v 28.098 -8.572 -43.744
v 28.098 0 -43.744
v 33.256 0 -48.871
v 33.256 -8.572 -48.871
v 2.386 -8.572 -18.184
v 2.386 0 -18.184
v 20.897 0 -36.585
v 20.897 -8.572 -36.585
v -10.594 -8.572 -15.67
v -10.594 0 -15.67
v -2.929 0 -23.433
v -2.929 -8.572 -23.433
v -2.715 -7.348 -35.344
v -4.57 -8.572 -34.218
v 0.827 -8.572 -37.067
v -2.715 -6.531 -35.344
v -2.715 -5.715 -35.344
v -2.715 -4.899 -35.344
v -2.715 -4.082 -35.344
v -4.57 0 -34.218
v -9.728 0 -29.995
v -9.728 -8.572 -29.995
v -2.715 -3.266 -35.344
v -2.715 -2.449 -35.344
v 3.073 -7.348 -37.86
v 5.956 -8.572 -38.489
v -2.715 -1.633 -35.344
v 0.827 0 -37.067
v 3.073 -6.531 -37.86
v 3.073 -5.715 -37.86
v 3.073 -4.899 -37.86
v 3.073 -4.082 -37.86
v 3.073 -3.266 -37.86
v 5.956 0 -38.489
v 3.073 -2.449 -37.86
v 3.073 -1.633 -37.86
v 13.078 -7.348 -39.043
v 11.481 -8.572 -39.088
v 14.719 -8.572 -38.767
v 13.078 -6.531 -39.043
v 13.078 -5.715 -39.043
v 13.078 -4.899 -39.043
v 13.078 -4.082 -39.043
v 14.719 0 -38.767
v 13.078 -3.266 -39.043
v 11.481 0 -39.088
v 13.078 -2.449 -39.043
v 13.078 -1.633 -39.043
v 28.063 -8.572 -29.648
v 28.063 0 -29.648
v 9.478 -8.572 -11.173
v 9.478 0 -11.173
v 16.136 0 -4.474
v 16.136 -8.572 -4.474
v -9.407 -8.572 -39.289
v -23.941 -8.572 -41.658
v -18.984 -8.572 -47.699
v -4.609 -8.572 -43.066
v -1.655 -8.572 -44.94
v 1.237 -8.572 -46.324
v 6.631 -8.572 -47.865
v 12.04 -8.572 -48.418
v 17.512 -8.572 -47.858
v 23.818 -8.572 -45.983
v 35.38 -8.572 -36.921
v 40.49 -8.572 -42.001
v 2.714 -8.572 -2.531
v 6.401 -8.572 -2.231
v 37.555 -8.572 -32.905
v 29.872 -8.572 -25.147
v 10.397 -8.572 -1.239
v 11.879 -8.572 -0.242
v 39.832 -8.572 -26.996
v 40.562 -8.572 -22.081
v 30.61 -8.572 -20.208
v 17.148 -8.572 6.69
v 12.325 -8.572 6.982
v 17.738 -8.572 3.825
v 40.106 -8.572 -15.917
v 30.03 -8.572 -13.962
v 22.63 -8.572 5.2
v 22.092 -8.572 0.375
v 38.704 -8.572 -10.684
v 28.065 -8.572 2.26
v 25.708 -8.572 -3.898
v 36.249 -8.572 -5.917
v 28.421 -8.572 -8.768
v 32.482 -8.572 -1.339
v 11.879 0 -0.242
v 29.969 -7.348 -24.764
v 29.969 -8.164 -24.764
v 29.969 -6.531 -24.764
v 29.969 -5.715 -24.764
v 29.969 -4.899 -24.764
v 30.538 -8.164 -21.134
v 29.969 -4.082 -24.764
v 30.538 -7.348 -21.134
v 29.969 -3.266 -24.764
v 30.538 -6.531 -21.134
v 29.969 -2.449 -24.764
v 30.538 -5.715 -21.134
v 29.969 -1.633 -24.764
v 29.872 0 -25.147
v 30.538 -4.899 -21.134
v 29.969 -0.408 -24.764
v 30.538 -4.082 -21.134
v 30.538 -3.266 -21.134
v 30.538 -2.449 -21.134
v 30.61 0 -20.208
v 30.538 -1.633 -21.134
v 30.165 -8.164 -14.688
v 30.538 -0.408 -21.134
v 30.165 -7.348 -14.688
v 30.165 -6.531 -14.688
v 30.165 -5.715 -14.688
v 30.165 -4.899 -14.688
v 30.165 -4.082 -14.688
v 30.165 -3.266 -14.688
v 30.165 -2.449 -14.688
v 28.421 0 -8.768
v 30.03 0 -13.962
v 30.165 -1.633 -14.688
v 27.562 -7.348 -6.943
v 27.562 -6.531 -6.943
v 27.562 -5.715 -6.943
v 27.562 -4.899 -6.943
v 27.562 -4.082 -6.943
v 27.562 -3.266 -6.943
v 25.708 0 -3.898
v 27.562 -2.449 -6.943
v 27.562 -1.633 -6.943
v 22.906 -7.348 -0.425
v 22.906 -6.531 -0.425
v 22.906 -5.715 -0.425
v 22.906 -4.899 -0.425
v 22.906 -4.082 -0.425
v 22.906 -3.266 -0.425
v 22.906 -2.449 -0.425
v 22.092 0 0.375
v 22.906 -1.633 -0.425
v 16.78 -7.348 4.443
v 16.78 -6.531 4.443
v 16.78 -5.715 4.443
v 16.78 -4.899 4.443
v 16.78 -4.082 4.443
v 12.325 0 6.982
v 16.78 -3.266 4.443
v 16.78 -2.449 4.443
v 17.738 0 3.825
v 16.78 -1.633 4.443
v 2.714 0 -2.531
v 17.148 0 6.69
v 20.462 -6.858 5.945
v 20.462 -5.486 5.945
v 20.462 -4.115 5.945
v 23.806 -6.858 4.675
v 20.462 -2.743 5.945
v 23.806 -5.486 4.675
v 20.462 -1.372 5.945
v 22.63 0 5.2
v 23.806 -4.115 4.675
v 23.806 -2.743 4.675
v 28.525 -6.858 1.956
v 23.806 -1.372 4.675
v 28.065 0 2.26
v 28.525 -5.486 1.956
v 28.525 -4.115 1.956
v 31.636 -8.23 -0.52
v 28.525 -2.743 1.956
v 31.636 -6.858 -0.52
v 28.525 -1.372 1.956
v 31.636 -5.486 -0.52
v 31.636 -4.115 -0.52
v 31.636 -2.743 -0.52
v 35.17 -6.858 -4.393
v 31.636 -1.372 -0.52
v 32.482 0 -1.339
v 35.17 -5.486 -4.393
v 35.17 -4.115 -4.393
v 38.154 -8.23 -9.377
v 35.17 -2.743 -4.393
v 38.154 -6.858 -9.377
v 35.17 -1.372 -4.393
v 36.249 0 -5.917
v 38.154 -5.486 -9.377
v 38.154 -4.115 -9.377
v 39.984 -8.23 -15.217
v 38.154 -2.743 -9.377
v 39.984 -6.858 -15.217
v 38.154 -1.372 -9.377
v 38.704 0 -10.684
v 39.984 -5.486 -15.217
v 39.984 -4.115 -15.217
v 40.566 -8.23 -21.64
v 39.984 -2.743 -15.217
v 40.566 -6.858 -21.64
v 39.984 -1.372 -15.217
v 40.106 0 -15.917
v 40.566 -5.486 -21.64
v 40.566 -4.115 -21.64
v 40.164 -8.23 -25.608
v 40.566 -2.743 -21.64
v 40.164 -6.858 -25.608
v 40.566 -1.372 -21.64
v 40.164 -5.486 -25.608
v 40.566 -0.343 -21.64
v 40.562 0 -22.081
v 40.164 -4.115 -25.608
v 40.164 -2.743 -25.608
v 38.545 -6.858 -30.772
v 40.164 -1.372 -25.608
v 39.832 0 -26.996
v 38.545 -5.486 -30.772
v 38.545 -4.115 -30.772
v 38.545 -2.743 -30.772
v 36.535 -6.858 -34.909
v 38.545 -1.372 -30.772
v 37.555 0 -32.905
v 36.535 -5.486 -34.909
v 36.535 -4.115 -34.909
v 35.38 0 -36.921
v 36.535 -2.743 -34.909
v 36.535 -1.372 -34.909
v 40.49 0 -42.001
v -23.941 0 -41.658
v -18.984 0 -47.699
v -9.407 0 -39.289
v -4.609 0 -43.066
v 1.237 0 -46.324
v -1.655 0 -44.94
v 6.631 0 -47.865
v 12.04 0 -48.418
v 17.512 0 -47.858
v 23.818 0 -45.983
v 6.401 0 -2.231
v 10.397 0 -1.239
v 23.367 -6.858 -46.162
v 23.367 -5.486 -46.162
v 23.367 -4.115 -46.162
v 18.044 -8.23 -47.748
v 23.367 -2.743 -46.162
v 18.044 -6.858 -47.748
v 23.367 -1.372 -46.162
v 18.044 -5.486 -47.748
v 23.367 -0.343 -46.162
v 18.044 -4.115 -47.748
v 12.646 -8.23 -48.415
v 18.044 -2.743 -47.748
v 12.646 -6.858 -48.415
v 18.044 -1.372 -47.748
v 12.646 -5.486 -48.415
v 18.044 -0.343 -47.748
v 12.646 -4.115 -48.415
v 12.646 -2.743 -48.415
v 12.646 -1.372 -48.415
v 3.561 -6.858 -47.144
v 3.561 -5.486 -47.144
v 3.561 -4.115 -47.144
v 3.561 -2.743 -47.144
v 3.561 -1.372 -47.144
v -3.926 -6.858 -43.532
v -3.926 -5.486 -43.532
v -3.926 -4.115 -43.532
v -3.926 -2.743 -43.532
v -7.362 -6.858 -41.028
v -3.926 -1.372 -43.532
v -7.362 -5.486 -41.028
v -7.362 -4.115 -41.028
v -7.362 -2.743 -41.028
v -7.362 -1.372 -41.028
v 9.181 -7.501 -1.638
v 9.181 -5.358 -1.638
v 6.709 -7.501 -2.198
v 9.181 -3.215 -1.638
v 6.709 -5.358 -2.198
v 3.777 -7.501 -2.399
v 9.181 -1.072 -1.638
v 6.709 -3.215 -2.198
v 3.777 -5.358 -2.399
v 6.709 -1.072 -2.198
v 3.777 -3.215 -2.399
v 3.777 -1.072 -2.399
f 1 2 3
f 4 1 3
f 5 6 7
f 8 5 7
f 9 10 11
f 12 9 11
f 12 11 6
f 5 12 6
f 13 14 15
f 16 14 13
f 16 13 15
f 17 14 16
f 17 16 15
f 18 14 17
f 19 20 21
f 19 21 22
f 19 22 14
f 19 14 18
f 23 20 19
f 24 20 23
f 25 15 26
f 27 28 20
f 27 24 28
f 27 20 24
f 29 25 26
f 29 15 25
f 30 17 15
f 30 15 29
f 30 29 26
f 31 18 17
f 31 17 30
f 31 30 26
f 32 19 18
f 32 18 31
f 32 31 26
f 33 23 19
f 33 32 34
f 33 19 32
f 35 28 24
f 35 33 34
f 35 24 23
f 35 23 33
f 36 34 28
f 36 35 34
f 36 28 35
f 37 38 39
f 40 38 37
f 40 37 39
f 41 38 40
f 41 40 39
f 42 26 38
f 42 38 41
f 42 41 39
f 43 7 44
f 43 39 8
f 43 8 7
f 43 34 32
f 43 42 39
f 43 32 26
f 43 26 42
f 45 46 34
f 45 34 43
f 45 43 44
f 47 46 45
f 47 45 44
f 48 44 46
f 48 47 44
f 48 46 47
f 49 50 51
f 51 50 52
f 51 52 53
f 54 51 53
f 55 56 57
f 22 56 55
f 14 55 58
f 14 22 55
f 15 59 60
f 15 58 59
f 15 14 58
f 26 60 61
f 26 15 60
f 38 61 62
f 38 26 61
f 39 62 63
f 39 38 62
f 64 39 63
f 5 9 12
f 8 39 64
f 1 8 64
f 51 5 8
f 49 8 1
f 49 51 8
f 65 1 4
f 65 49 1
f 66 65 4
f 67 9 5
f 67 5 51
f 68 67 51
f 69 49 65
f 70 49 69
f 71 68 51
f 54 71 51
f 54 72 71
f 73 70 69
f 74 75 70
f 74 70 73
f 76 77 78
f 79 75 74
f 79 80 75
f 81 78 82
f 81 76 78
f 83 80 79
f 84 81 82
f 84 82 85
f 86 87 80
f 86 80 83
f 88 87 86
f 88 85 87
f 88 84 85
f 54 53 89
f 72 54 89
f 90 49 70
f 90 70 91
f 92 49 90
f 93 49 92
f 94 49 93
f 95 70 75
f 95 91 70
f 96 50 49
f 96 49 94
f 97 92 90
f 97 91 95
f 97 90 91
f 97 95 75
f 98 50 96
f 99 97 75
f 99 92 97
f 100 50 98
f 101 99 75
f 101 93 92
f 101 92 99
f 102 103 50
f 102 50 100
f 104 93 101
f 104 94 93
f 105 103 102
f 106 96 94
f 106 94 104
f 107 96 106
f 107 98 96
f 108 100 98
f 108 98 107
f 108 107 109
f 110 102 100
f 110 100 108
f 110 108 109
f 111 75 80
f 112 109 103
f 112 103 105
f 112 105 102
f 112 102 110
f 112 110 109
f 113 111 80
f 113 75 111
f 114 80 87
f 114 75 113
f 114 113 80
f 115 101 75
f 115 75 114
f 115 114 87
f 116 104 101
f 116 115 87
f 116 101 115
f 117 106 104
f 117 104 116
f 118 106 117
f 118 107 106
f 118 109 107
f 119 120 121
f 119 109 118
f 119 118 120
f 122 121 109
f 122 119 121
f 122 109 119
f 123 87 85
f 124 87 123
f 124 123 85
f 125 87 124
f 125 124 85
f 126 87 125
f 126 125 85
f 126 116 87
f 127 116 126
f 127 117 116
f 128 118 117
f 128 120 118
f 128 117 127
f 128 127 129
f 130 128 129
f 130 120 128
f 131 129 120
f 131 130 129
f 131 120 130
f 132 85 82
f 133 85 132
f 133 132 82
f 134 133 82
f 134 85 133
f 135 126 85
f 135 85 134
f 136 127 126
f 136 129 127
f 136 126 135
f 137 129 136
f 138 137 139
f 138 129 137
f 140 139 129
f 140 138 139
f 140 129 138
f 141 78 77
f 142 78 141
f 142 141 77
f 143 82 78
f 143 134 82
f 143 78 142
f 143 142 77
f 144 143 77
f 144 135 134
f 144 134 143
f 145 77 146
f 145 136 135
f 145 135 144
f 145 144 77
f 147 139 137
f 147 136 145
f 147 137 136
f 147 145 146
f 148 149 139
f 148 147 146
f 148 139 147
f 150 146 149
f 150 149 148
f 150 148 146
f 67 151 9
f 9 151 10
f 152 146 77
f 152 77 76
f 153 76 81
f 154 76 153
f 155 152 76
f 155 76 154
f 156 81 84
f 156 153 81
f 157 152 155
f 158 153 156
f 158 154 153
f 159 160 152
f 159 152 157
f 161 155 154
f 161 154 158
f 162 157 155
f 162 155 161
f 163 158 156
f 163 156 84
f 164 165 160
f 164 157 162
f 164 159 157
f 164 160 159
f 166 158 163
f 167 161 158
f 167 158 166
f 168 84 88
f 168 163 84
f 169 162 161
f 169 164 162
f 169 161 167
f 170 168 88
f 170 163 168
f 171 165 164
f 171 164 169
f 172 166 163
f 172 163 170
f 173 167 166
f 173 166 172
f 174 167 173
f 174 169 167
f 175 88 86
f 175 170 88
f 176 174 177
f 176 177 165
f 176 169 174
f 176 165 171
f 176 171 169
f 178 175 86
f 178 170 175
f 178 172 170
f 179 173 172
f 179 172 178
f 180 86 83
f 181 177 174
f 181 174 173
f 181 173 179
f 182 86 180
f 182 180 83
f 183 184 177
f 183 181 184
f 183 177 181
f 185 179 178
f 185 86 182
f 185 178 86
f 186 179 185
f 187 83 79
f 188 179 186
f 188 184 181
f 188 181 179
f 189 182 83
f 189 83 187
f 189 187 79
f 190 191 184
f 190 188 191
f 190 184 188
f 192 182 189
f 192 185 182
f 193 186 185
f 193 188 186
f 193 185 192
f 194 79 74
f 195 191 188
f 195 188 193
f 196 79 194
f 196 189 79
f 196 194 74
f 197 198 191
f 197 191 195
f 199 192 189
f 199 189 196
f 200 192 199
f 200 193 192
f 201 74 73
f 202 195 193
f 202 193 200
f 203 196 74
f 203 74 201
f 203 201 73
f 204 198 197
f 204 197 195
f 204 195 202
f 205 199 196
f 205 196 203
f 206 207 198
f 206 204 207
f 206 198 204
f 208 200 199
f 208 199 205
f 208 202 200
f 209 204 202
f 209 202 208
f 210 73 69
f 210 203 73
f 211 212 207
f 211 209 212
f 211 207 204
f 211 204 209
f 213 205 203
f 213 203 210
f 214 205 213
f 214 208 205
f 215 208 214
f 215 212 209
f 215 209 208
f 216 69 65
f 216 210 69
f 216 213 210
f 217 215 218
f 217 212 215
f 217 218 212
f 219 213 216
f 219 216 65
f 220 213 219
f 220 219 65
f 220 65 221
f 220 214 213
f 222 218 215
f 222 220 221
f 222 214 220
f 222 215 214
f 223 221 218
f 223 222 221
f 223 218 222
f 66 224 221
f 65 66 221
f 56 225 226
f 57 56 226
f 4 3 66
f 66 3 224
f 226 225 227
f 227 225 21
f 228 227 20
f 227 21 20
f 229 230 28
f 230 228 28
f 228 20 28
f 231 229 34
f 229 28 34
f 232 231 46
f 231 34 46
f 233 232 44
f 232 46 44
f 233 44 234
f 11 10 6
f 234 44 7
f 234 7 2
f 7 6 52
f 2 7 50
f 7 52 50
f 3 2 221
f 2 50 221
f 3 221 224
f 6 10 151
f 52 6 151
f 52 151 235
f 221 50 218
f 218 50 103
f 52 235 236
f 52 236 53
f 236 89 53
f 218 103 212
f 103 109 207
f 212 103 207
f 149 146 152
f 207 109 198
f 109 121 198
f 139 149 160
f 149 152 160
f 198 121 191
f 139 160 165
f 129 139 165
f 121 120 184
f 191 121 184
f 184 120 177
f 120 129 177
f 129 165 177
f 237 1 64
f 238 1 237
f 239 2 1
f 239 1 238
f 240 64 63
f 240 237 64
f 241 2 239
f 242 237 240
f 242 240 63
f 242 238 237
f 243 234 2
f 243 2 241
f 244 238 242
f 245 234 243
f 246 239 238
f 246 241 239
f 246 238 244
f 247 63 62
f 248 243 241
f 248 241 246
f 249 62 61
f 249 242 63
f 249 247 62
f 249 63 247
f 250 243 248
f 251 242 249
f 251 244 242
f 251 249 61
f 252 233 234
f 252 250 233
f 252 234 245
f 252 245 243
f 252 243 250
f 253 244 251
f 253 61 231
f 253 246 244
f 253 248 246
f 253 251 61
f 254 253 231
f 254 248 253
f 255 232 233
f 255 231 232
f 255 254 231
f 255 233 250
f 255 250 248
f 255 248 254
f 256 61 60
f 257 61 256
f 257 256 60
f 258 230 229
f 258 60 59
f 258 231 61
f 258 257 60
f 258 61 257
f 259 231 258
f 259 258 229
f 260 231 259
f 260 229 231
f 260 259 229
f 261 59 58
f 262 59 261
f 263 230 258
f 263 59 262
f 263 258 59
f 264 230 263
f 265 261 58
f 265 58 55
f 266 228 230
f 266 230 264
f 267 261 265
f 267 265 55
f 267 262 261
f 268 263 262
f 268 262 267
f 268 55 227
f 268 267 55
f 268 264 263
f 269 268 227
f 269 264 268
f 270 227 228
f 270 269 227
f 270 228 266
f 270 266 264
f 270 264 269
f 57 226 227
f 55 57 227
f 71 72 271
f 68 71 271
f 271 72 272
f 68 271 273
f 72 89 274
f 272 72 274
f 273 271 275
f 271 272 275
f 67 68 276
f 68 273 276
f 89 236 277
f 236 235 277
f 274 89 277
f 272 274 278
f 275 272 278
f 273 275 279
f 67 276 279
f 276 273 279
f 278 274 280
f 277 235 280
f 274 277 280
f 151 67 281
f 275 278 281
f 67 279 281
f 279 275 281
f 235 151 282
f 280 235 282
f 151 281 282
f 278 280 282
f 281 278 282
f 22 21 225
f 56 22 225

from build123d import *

# Parameters (mm, degrees)
F2_DEPTH = 6.35
F3_DEPTH = 6.35
F4_SCALE = 1.35


with BuildPart() as f2:
    # F1 (on Front) → F2 (new body)
    with BuildSketch(Plane.XZ):
        with BuildLine():
            Line((2.0100830588, -1.8745424459), (-7.8472765163, -11.6076041013))
            Line((-7.8472765163, -11.6076041013), (-2.1699381241, -17.3574460259))
            Line((-2.1699381241, -17.3574460259), (1.7674344249, -13.4697223929))
            Line((1.7674344249, -13.4697223929), (24.6342346072, -36.2006090581))
            Line((24.6342346072, -36.2006090581), (29.9926754087, -31.1118494719))
            Line((29.9926754087, -31.1118494719), (7.0203917258, -8.276106269))
            Line((7.0203917258, -8.276106269), (11.9528423377, -3.3141633316))
            Line((11.9528423377, -3.3141633316), (8.7988910946, -0.1789582447))
            add(Edge.make_bspline(
                [(8.7988910946, -0.1789582447), (8.4915822271, -0.4268185401), (7.884025876, -0.9168437644), (6.812984834, -1.2110842235), (5.7607040583, -1.4951452719), (4.9636876382, -1.6474868702), (4.0066335683, -1.7029838445), (2.8224195307, -1.765104938), (2.3226285635, -1.8299656868), (2.1049594849, -1.8610107088), (2.0100830588, -1.8745424459)],
                knots=[0, 0, 0, 0, 0.1457280341, 0.28810751, 0.428717987, 0.5493474346, 0.6832636078, 0.8310512812, 0.9263595421, 1, 1, 1, 1], degree=3))
        make_face()
    extrude(amount=F2_DEPTH)

    # F0 (on Front) → F3 (join)
    with BuildSketch(Plane.XZ):
        with BuildLine():
            Line((-7.2056818753, -22.2188271582), (-17.7342074227, -30.8576199099))
            Line((-17.7342074227, -30.8576199099), (-14.0623990446, -35.3326350451))
            Line((-14.0623990446, -35.3326350451), (-6.9682779722, -29.1031114757))
            add(Edge.make_bspline(
                [(9.1296667233, 5.1718582399), (9.6781859866, 5.1849146526), (10.8194790728, 5.21208087), (12.7441165618, 4.9857473803), (15.2451481768, 4.4360080826), (17.6618182877, 3.5589302995), (21.2322086722, 1.4851892372), (23.4660087366, -0.316831433), (26.2144792862, -3.2140079757), (28.4320774378, -6.9109964982), (29.789536096, -11.1586098492), (30.1558781606, -16.0372078457), (29.8627060621, -18.955121982), (28.7071599618, -22.7844601499), (27.034328063, -25.8390843438), (26.3606630932, -27.4026946013), (23.6298018345, -29.9778777076), (20.9568468096, -32.5509410352), (17.327323492, -34.3053388548), (13.401554369, -35.4676447014), (9.4023284242, -36.0138419384), (5.7565353723, -35.6495486641), (2.6399914127, -35.0224045555), (-0.4311152441, -33.8045805217), (-2.8850770783, -32.3142704604), (-5.4549392551, -30.4401473194), (-6.503821434, -29.5134591608), (-6.9682779722, -29.1031114757)],
                knots=[0, 0, 0, 0, 0.0285814378, 0.0594688273, 0.0945167283, 0.1306066312, 0.1751428462, 0.2131940739, 0.2568893258, 0.3028820712, 0.3500947134, 0.398556368, 0.436666533, 0.4810586728, 0.5219866905, 0.550708259, 0.5927056098, 0.6361496757, 0.6802075239, 0.7251798006, 0.7696857552, 0.8119103586, 0.8514788828, 0.8913587568, 0.9293857799, 0.9687312485, 1, 1, 1, 1], degree=3))
            add(Edge.make_bspline(
                [(-7.2056818753, -22.2188271582), (-6.3812466924, -22.9073918829), (-4.7244781605, -24.4822778909), (-2.0462273712, -26.2689526242), (2.2202454087, -28.2955457327), (6.3770617171, -28.7636613904), (9.5887887908, -29.1345162933), (12.2879580559, -28.3489648275), (13.6092182696, -27.8673694913), (15.6078973916, -27.1684028035), (18.4760859446, -25.207066996), (20.9098618576, -22.1725260541), (22.3129541159, -18.499471744), (22.6338520936, -15.6483912952), (22.7344537145, -14.2248144523), (22.4281637557, -10.7638092583), (21.6419035573, -7.9083843186), (20.5201993879, -5.1119392679), (18.6442207253, -2.2221609046), (17.0292486023, -0.2885415089), (14.9099308633, 1.6077778026), (12.4382943713, 3.3637327802), (10.270746931, 4.5482715464), (9.1296667233, 5.1718582399)],
                knots=[0, 0, 0, 0, 0.049491434, 0.098674406, 0.157645306, 0.2136724525, 0.262894252, 0.3075182277, 0.3396115835, 0.3783484473, 0.4289933244, 0.4830380296, 0.5374641382, 0.5824599205, 0.6151650415, 0.6651165227, 0.7128738028, 0.7601366968, 0.8104970919, 0.8539369629, 0.8992772275, 0.9468473633, 1, 1, 1, 1], degree=3))
        make_face()
    extrude(amount=F3_DEPTH)


with BuildPart() as f2_1:
    # F4: moved
    add(f2.part.scale(F4_SCALE))


solid = f2_1.part
